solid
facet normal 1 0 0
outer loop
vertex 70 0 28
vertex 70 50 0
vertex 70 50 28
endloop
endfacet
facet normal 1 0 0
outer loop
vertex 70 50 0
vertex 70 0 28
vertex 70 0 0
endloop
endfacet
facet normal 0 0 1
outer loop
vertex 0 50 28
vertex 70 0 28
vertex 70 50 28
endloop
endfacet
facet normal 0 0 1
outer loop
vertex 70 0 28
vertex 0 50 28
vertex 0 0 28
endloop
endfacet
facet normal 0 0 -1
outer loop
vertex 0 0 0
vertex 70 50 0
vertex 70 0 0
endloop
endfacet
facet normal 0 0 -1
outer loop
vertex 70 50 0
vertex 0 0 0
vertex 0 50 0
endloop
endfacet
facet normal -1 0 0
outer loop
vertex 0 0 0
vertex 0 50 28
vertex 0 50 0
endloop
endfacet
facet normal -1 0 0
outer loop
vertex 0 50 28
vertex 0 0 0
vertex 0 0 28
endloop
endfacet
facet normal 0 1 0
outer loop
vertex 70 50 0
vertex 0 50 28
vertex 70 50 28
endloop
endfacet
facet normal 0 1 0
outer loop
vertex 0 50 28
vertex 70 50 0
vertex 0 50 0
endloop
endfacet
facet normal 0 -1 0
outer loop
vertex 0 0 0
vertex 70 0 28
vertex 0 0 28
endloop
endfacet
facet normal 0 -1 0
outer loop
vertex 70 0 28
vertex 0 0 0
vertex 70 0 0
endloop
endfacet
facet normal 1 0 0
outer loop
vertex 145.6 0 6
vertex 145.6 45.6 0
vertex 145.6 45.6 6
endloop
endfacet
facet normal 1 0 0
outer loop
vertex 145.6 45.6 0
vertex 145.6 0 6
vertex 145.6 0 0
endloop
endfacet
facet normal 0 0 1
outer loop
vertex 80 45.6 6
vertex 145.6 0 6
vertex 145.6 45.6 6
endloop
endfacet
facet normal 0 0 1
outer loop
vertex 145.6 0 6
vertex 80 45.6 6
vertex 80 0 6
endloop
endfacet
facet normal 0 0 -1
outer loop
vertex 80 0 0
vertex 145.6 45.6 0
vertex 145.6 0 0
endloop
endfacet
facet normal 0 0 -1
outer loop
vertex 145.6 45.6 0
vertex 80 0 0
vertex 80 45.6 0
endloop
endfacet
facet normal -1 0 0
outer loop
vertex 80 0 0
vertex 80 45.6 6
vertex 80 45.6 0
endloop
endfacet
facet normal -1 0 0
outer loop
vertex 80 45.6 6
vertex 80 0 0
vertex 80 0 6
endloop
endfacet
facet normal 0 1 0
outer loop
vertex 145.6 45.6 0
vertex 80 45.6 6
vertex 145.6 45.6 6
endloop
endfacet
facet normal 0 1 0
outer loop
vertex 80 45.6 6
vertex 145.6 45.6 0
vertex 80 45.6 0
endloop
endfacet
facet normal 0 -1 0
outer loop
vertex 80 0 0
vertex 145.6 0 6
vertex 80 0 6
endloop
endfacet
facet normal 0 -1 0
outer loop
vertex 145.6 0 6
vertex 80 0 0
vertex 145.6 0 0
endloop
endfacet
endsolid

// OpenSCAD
// Two-part enclosure for a small electronics board (e.g. Arduino-based temperature logger)
// Print orientation: both parts lie flat on the bed, side by side, with a 10 mm gap.
// The box prints open-top; the lid prints upside down so its lip faces up and slides into the box.

// ---------------- Parameters ----------------
box_x      = 70;    // box outer length (X)
box_y      = 50;    // box outer width (Y)
box_h      = 30;    // box outer height (Z)
wall       = 2;     // wall thickness
floor      = 2;     // floor thickness under the board

lip_t      = 1.5;   // lip wall thickness
lip_h      = 4;     // lip height above the plate
lip_x      = 65.6;  // lip outer length (X)
lip_y      = 45.6;  // lip outer width (Y)
clearance  = 0.2;   // clearance between lip outer size and box opening

eps        = 0.5;   // overcut for clean boolean differences

$fn = 64;

// ---------------- Derived ----------------
box_i_x = box_x - 2 * wall;   // inner length
box_i_y = box_y - 2 * wall;   // inner width
lip_x1  = lip_x - 2 * clearance;
lip_y1  = lip_y - 2 * clearance;

// ---------------- Model ----------------
difference() {
    union() {
        // Box: solid floor + walls, open top
        cube([box_x, box_y, box_h - floor]);

        // Lid: plate + centred lip (printed upside down)
        translate([box_x + 10, 0, 0])
            cube([lip_x, lip_y, floor + lip_h]);
    }

    // Lip pocket cut into the box top, with 0.2 mm clearance on each side
    translate([box_x + 10 - floor - eps, 0, box_h - floor])
        cube([lip_x1, lip_y1, floor + lip_h + eps]);
}
